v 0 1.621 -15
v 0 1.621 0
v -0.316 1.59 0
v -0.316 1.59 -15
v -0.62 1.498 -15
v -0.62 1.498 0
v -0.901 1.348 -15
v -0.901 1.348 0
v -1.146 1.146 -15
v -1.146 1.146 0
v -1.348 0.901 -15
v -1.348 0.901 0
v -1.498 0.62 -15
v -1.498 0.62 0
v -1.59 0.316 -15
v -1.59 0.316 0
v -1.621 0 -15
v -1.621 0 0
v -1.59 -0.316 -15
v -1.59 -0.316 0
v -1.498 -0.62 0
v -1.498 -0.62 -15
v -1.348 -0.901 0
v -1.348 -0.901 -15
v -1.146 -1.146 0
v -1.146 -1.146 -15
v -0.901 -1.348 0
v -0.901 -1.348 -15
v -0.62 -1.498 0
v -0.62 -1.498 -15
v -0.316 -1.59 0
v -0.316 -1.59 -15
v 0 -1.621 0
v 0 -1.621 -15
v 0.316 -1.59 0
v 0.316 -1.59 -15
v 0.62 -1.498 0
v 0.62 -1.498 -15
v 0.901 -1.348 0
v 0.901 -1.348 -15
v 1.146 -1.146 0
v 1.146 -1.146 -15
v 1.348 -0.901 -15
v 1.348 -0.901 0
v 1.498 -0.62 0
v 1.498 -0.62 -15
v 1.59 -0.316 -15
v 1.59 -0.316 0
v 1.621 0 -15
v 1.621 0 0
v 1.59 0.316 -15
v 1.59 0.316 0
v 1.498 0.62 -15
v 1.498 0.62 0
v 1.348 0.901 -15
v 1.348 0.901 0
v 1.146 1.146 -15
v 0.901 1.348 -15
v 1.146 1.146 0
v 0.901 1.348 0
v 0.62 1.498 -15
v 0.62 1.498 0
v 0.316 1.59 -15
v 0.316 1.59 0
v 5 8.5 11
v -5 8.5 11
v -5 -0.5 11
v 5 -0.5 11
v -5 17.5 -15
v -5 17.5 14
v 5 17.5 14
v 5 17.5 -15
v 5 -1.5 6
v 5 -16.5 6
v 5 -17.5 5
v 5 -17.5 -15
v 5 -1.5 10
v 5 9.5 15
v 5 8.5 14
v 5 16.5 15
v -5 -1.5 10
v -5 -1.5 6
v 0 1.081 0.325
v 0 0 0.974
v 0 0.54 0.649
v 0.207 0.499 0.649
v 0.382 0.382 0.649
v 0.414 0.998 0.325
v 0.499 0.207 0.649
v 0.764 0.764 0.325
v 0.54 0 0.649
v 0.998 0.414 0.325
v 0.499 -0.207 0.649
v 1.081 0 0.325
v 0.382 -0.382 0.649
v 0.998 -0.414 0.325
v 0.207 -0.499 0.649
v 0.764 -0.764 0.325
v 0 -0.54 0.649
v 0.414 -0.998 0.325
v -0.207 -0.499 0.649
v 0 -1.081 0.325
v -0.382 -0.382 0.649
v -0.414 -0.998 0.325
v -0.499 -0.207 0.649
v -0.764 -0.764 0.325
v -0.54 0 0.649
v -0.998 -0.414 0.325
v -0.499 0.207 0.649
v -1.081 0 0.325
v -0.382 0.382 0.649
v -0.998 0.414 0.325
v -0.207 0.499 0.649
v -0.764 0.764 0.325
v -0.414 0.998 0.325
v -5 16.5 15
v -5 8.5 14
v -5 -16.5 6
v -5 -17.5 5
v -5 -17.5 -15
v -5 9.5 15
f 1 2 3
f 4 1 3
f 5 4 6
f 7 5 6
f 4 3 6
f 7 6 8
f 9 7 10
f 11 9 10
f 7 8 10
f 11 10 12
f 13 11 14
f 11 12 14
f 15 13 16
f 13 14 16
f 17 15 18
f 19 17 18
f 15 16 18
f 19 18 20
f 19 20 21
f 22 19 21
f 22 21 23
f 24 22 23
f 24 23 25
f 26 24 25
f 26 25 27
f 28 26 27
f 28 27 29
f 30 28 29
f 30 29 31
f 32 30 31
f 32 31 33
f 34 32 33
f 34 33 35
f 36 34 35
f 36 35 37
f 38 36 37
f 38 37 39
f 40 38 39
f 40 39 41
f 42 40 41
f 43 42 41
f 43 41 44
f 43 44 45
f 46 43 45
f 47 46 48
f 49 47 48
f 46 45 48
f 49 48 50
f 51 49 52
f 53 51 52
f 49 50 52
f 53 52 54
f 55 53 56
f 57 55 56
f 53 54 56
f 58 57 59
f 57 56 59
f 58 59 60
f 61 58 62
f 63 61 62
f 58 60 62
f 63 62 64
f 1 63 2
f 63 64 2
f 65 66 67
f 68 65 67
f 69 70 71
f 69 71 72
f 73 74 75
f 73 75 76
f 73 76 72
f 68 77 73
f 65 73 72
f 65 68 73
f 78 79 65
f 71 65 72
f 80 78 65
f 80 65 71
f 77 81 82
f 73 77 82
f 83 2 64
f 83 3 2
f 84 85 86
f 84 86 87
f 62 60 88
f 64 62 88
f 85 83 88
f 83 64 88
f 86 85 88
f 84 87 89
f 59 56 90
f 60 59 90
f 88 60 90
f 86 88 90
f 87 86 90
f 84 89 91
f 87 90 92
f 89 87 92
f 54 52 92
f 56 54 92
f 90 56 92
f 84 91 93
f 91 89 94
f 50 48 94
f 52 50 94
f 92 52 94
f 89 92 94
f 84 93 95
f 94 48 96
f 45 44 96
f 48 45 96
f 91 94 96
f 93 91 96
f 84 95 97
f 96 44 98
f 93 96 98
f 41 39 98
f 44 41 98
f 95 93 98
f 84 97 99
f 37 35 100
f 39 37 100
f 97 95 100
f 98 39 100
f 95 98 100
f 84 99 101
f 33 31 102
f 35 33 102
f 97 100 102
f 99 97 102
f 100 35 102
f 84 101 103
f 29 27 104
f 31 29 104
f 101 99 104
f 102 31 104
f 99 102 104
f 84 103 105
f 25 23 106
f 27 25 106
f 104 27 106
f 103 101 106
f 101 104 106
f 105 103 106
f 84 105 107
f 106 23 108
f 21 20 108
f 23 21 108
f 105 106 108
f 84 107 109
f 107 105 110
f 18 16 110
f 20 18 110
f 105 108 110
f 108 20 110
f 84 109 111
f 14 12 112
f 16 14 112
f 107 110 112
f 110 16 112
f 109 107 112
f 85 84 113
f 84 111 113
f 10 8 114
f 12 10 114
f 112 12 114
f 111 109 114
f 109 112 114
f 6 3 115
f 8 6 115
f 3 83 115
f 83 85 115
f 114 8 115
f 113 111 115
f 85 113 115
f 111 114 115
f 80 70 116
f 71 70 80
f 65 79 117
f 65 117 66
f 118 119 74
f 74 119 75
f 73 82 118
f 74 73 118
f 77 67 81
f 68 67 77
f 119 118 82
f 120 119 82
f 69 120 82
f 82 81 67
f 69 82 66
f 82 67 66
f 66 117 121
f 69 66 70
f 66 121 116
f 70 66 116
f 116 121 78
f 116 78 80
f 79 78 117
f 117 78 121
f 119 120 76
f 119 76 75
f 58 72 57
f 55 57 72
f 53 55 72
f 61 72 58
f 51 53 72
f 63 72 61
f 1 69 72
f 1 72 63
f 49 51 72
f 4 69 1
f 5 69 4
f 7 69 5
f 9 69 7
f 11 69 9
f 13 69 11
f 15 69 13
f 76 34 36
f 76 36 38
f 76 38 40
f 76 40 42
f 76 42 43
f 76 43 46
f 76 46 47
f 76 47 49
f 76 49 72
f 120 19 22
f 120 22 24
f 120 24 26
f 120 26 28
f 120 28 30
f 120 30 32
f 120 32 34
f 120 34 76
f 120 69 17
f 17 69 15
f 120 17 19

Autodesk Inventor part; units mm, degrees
ref_plane "YZ Plane" through (0, 0, 0) normal (1, 0, 0) x (0, 1, 0)
ref_plane "XZ Plane" through (0, 0, 0) normal (0, 1, 0) x (-1, 0, 0)
ref_plane "XY Plane" through (0, 0, 0) normal (0, 0, 1) x (1, 0, 0)
sketch "Esboço1" plane through (0, 0, 0) normal (1, 0, 0) x (0, 1, 0)
  line L0 (-24.5, 0) -> (24.5, 0) construction
  line L1 (0, -21) -> (0, 21) construction
  line L2 (-17.5, 15) -> (17.5, 15)
  line L3 (17.5, 15) -> (17.5, -15)
  line L4 (17.5, -15) -> (-17.5, -15)
  line L5 (-17.5, -15) -> (-17.5, 15)
  line L6 (-17.5, 15) -> (-1.5, 15)
  line L7 (-1.5, 15) -> (-1.5, 6)
  line L8 (-1.5, 6) -> (-17.5, 6)
  line L9 (-17.5, 6) -> (-17.5, 15)
  line L10 (-1.5, 15) -> (8.5, 15)
  line L11 (8.5, 15) -> (8.5, 11)
  line L12 (8.5, 11) -> (-1.5, 11)
  line L13 (-1.5, 11) -> (-1.5, 15)
  point P0 (0, 0)
  point P1 (8.5, 15)
  point P2 (-1.5, 11)
  point P3 (-17.5, 6)
  dimension "d0" = 35
  dimension "d1" = 30
  dimension "d3" = 16
  dimension "d5" = 10
  dimension "d16" = 4
  dimension "d17" = 9
extrude "Extrusão1" add sketch "Esboço1" along normal mid plane 10 contours L8 L7 L12 L11 L2 L3 L4 L5
sketch "Esboço2" plane through (5, 17.5, -15) normal (0, 0, -1) x (-1, 0, 0)
  point P0 (5, -17.5)
hole "Furo1" at (0, 0, -15) direction (0, 0, 1) diameter 3.242 depth 15 tip angle 118 thread size "M4x0.7" class "6H" standard "ISO Metric profile"
chamfer "Chanfro1" distance 1 angle 45 4 edges at (0, -1.5, 11) (0, 8.5, 15) (0, 17.5, 15) (0, -17.5, 6)
properties part number "GRJ-05-102" material "Fenolite OR"
